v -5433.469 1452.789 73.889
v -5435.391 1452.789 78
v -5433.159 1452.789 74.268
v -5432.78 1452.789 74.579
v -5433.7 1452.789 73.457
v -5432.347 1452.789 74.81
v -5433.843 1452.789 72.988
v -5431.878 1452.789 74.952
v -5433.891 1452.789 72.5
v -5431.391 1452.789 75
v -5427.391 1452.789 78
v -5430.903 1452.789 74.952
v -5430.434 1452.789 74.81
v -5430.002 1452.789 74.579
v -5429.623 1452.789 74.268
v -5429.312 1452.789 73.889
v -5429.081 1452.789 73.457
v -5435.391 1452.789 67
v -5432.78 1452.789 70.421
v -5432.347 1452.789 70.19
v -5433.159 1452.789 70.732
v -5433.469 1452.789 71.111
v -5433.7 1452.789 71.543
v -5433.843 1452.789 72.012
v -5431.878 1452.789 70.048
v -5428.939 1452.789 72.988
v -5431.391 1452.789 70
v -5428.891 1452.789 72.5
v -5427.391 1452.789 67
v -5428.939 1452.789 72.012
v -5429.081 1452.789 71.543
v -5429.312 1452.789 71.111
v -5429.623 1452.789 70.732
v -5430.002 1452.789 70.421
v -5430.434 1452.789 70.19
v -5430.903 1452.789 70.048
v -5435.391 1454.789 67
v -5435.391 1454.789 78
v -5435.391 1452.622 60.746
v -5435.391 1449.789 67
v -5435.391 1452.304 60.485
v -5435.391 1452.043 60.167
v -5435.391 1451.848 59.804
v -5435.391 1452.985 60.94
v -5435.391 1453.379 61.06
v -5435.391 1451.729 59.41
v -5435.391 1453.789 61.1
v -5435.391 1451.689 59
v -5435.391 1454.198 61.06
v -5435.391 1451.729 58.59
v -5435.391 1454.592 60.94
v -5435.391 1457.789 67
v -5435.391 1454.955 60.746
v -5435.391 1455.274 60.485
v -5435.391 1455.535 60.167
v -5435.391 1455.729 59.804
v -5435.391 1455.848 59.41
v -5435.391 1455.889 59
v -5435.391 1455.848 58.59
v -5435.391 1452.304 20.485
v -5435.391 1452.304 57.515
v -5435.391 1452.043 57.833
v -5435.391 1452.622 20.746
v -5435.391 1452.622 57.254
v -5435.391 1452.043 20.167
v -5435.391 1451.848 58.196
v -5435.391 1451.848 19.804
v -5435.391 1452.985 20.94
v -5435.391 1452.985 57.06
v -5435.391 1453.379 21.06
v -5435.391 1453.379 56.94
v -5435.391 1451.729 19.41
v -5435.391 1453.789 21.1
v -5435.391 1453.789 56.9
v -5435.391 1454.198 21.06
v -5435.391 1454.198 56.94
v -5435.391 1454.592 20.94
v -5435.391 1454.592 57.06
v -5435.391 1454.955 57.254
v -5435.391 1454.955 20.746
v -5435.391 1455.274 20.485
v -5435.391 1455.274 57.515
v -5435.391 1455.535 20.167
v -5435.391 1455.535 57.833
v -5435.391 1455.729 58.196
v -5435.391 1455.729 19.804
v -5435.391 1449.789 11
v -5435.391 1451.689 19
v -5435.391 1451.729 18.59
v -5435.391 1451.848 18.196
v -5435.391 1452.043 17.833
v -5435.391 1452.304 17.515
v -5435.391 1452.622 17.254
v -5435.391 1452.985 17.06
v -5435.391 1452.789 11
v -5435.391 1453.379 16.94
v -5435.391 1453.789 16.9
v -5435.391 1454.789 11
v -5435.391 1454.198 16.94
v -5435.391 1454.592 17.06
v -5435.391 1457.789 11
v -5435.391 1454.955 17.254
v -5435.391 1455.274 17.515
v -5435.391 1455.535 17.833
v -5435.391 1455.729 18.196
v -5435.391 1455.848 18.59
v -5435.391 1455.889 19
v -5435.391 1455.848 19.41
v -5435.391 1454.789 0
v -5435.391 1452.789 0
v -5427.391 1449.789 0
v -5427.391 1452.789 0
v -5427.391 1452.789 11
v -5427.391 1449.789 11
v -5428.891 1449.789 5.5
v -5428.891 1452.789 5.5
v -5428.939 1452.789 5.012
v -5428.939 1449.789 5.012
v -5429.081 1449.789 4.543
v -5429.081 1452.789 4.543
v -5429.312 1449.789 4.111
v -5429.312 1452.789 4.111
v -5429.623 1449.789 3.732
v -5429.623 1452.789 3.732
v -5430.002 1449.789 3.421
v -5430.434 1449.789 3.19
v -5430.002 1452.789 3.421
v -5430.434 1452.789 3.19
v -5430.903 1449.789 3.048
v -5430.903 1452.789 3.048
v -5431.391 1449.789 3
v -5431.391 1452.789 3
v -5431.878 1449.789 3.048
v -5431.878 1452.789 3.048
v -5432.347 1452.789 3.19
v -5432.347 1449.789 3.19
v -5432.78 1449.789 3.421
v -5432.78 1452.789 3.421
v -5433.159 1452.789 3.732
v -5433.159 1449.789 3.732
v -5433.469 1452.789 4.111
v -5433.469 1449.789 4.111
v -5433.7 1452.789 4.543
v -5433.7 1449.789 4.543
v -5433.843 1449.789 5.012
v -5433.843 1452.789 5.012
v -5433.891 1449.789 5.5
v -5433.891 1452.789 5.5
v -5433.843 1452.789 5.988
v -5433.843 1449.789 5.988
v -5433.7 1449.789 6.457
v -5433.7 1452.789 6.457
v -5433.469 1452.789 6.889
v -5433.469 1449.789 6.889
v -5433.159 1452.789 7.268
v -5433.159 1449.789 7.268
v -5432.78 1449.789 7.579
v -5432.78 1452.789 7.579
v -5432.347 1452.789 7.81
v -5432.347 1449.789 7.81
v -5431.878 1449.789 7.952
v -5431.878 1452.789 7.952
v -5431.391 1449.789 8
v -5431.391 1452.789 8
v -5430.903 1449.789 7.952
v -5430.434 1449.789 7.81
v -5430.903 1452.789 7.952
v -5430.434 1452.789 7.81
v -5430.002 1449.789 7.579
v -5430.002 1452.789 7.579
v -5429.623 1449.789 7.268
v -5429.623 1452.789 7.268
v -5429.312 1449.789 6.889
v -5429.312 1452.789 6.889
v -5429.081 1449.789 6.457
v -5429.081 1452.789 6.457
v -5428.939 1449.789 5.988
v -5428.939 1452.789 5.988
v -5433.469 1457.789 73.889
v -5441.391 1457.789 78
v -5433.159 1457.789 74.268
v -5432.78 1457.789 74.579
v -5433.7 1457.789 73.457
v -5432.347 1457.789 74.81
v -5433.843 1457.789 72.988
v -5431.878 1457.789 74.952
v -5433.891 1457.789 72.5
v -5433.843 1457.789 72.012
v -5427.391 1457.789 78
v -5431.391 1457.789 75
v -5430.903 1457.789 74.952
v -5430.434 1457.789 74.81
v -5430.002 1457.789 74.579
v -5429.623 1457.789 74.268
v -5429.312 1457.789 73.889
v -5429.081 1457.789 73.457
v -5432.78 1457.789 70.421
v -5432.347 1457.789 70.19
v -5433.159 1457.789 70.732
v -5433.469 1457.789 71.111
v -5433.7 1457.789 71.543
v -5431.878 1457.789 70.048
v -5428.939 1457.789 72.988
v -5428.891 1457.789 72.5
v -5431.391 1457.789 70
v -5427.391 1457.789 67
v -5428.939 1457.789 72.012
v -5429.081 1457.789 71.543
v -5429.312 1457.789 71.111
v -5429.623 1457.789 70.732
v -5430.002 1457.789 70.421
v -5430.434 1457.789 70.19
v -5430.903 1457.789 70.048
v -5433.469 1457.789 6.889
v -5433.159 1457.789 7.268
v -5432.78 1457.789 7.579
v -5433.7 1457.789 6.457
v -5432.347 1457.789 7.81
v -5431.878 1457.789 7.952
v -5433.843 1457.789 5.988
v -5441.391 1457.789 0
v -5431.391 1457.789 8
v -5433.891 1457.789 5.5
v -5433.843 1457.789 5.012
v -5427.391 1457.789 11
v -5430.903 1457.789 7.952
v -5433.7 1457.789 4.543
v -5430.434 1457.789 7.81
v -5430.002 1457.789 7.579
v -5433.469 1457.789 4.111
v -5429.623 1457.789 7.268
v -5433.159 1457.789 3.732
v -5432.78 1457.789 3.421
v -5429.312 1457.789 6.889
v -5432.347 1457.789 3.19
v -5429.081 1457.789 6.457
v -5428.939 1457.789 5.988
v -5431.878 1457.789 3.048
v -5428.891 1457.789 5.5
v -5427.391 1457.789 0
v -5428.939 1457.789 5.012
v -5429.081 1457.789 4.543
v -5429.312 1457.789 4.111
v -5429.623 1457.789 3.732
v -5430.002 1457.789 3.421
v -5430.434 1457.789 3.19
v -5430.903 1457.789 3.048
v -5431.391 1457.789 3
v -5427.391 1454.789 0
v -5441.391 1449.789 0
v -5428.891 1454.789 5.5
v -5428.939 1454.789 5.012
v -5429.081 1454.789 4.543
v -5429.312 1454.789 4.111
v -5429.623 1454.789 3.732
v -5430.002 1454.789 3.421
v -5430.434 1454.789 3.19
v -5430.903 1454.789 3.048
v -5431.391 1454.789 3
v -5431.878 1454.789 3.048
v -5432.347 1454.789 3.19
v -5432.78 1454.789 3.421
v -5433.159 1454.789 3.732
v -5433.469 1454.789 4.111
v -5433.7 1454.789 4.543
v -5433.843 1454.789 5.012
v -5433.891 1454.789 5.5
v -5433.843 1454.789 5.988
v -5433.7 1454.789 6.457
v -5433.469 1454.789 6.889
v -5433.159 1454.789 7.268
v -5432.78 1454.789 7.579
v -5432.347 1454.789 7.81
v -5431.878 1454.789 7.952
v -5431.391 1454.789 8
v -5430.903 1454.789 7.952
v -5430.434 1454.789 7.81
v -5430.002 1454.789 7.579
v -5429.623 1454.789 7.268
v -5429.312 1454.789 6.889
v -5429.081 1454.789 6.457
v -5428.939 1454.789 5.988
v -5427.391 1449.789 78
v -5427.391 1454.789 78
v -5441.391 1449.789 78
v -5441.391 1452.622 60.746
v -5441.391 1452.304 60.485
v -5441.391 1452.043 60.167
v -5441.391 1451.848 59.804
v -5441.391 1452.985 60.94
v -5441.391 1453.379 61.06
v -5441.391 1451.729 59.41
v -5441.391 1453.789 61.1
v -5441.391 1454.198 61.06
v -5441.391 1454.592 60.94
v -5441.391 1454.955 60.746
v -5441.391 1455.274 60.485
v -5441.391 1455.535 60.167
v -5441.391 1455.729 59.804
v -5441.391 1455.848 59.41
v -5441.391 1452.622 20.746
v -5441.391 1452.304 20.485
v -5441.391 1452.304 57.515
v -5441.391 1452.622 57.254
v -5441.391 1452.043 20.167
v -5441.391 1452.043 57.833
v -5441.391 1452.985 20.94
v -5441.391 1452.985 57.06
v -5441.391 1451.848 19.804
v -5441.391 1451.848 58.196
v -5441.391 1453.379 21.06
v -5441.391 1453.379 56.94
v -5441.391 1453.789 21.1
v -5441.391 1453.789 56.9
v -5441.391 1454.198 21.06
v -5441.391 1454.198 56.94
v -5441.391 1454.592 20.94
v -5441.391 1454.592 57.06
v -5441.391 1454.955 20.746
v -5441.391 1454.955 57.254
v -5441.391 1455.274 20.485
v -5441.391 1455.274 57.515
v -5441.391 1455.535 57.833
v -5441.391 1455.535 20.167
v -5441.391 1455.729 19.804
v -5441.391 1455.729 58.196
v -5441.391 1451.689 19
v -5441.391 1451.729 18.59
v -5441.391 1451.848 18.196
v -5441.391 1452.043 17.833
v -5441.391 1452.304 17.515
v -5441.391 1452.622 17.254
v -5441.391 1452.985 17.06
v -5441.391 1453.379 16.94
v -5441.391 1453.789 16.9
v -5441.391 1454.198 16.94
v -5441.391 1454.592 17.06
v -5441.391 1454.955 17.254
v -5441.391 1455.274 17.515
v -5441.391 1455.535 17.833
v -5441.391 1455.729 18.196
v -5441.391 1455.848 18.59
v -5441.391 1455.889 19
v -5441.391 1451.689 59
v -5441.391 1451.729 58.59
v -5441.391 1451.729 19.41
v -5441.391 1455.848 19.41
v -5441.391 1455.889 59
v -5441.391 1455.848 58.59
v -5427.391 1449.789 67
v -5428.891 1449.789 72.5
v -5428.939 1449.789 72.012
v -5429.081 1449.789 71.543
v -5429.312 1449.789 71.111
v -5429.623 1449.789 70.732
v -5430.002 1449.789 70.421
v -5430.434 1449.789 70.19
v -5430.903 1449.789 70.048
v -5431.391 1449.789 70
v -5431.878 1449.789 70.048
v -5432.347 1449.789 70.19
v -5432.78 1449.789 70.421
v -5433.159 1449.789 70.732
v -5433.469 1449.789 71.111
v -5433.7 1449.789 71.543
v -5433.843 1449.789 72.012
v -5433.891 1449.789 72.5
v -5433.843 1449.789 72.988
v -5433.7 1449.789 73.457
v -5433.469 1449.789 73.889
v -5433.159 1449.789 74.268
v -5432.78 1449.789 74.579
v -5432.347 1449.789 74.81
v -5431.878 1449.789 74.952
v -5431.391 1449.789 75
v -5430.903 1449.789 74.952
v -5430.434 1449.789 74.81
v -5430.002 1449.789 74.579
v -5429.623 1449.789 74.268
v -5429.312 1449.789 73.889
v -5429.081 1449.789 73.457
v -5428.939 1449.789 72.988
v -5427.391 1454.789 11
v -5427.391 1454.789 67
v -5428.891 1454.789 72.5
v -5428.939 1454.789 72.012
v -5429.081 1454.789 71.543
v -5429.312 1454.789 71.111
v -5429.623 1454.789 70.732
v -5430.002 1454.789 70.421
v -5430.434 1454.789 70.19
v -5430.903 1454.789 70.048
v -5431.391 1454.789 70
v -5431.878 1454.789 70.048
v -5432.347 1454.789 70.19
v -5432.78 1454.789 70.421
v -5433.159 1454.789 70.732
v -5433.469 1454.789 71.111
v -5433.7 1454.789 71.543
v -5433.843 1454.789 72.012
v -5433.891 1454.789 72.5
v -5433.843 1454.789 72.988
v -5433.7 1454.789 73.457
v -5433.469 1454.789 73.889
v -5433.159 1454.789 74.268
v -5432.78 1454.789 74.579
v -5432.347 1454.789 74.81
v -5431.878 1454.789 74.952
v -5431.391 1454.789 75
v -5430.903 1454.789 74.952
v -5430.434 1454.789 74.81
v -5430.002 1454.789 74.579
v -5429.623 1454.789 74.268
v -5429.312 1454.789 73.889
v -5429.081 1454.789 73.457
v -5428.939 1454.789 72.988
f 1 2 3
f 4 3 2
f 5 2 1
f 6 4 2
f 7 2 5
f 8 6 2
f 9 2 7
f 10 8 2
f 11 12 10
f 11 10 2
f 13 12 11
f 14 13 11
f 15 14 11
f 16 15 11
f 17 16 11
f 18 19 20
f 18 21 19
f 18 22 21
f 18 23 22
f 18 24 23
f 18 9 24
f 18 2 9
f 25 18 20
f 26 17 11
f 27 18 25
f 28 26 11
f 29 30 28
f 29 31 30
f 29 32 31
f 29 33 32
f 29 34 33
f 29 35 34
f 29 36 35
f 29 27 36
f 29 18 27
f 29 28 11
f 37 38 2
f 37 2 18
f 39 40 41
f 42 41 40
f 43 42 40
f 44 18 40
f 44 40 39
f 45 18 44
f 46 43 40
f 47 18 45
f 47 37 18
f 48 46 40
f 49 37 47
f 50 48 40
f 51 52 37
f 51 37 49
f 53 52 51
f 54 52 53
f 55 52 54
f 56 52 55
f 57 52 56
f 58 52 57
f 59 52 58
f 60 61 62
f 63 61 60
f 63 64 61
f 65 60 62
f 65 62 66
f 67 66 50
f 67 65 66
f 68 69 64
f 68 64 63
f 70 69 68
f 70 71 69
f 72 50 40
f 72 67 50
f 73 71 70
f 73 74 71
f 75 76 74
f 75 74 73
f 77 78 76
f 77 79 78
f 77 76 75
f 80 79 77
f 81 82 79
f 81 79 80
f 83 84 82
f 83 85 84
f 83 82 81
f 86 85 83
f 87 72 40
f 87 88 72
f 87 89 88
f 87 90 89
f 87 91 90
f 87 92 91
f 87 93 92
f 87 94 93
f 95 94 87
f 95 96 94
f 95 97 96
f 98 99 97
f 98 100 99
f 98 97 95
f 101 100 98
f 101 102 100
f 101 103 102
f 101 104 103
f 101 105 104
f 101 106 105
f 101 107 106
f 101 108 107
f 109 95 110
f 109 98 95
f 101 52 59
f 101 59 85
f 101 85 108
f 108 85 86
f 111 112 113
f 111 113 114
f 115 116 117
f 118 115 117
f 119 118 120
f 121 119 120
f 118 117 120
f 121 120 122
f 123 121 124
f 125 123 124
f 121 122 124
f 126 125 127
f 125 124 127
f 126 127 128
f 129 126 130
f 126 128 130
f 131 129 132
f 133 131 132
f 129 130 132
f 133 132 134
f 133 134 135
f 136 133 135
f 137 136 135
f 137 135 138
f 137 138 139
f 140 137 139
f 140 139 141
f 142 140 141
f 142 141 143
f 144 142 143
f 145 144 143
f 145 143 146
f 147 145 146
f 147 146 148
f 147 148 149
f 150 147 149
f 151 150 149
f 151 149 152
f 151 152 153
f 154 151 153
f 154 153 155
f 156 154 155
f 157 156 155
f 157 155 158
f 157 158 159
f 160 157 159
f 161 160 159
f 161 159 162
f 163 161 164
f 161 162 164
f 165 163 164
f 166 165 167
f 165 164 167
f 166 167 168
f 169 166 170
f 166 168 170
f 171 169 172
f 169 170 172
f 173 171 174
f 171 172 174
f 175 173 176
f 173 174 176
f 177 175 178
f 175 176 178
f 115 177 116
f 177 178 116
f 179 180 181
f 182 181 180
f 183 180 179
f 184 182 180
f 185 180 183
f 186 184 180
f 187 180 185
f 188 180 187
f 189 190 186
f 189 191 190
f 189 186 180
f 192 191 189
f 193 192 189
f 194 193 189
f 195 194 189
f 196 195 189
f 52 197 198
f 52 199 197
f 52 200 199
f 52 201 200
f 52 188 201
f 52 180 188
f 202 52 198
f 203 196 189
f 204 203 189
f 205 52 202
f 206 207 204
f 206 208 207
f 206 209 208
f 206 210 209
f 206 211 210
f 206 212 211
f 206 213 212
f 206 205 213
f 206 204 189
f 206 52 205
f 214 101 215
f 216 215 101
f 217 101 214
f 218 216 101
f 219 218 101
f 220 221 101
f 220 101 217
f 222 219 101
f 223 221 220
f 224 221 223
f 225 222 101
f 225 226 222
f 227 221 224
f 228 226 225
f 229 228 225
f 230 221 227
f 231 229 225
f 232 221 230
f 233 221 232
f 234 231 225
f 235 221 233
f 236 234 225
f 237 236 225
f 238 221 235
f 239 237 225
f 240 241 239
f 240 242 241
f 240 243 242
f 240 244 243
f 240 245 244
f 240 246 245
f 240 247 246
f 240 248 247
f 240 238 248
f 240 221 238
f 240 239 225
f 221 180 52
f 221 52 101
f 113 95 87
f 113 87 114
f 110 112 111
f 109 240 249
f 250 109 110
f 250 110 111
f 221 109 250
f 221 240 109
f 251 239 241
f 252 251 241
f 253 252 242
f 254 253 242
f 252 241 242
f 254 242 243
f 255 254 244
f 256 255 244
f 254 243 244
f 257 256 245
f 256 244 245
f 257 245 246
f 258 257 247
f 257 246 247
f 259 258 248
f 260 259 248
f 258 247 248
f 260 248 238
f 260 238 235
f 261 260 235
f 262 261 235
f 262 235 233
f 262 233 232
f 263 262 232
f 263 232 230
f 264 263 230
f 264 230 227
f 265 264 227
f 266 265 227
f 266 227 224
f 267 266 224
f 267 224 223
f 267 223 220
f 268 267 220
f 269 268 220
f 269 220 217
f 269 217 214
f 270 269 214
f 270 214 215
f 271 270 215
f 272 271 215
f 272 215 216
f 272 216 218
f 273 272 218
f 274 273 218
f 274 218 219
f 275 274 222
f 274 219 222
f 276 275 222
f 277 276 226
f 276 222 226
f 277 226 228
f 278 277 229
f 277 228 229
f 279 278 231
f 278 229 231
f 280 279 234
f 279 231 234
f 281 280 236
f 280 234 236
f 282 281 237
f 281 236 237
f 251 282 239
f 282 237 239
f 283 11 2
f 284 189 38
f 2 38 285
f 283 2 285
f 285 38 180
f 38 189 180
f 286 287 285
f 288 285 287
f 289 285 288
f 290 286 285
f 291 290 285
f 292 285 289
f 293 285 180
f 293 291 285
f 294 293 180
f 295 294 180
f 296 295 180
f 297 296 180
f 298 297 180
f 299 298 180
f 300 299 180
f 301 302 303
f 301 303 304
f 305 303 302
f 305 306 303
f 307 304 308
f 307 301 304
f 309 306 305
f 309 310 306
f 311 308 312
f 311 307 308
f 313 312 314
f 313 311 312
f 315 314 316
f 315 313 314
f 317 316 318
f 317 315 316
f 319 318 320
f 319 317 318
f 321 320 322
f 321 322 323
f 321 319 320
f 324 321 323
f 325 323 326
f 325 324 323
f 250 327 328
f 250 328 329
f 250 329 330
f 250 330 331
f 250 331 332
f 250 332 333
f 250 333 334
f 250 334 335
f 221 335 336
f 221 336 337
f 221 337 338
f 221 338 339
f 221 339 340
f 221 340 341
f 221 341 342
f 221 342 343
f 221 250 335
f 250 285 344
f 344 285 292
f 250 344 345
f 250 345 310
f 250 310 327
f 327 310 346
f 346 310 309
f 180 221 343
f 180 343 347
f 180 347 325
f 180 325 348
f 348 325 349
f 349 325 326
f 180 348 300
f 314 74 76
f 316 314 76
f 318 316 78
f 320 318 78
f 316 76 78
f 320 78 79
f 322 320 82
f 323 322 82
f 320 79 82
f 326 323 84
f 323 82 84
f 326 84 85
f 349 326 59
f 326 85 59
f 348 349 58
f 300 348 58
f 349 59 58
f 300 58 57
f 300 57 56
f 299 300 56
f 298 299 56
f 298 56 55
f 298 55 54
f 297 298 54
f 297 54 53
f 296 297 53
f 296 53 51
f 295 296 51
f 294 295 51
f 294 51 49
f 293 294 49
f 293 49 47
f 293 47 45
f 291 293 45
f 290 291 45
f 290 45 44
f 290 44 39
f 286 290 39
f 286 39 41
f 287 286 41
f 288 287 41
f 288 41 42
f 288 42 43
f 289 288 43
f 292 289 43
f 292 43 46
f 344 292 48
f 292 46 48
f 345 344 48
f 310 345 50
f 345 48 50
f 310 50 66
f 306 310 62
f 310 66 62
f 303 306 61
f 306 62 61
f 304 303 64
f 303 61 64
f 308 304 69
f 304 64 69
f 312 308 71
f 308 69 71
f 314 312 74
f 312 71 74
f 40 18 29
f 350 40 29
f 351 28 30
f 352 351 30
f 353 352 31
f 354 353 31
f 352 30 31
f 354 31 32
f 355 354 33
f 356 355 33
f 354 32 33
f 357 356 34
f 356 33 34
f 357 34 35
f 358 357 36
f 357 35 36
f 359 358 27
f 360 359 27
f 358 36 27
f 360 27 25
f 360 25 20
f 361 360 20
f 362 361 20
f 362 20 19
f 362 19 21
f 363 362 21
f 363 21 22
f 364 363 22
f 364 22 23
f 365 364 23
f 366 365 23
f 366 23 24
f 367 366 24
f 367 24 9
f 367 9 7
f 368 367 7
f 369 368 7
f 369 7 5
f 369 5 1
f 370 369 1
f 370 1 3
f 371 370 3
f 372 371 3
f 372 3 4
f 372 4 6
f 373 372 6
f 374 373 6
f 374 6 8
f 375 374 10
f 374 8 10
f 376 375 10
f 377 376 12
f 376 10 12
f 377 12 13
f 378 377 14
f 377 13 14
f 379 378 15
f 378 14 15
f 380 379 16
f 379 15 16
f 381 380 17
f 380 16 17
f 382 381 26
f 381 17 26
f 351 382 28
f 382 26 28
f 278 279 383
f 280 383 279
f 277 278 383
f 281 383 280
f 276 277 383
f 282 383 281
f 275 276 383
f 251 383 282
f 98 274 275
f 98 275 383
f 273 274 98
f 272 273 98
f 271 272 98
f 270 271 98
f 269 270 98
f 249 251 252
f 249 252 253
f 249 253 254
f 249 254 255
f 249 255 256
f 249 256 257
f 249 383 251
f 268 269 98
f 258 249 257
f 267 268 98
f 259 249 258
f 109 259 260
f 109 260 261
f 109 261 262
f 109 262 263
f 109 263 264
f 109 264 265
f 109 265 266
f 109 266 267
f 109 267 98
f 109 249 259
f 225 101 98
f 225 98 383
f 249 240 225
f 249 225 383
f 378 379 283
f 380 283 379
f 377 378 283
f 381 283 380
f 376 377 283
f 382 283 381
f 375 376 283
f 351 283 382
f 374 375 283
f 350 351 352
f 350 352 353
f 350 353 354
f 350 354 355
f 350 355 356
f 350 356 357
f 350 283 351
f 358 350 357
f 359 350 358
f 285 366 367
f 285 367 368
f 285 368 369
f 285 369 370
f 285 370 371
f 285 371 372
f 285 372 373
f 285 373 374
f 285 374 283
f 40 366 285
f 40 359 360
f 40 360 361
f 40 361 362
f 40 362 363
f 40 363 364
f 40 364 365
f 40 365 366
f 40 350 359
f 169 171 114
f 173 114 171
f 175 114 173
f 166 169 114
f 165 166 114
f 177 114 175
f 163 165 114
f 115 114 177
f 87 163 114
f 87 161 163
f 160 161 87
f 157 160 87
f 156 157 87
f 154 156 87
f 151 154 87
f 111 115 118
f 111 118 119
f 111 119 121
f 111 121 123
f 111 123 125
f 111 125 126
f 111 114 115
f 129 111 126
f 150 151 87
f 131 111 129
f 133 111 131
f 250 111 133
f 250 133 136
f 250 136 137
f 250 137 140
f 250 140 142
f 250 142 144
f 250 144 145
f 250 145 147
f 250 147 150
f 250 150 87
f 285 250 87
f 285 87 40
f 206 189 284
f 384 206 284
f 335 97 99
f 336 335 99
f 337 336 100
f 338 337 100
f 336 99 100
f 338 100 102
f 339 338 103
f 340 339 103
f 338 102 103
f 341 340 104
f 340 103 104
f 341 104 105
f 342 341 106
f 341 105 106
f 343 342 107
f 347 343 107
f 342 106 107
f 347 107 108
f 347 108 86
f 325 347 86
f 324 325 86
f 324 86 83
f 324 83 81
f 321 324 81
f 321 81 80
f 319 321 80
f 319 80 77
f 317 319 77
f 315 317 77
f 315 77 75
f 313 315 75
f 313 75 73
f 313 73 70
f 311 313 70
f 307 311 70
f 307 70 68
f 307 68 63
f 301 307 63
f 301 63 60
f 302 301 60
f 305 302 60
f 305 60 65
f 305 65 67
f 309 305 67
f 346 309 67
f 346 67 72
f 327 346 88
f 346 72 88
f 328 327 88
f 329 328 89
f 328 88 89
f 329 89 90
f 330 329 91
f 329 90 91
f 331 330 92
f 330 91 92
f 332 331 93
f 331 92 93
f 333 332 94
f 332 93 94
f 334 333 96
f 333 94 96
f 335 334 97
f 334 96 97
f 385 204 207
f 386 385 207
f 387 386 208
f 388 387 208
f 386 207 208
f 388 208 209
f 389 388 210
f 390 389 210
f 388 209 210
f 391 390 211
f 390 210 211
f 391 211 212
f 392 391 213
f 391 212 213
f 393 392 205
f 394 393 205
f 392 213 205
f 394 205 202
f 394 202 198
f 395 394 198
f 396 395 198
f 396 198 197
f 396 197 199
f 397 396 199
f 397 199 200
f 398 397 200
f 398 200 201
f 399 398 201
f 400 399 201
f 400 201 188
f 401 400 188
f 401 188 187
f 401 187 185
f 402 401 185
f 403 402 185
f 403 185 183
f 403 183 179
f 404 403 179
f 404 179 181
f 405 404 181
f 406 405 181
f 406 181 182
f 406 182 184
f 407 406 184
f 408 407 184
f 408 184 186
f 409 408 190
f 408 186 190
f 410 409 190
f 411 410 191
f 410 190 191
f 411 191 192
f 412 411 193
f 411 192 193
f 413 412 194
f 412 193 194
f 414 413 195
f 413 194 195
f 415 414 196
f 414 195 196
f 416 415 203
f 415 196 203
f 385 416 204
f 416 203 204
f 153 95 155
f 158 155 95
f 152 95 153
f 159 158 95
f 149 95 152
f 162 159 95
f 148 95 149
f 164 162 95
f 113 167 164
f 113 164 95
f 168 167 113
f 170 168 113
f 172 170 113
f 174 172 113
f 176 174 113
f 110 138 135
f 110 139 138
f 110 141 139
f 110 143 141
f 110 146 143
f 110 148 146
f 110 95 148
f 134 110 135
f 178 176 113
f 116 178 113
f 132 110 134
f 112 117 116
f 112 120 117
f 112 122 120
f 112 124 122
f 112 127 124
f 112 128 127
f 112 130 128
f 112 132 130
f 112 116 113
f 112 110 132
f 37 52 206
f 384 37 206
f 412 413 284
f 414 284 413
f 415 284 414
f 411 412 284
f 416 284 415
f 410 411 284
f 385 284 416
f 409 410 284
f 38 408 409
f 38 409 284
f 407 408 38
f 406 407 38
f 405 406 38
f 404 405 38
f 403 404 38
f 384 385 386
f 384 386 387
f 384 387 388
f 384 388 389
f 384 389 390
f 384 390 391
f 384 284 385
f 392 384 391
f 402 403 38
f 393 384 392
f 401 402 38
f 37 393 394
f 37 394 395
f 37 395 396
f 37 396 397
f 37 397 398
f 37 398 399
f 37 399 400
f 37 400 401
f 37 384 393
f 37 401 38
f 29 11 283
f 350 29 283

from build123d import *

# Parameters (mm, degrees)
EXTRUDE_1_DEPTH     = 78
SKETCH_2_W          = 8
SKETCH_2_H          = 56
CUT_EXTRUDE_1_DEPTH = 9
SKETCH_3_R          = 2.5
CUT_EXTRUDE_2_DEPTH = 9
HOLE_WIZARD_M5_1_D  = 4.2


with BuildPart() as part:
    # 草图1 → 凸台-拉伸1 (new body)
    with BuildSketch(Plane.XY):
        Polygon((-5441.39073995, 1449.788604117), (-5441.39073995, 1457.788604117), (-5427.39073995, 1457.788604117), (-5427.39073995, 1454.788604117), (-5435.39073995, 1454.788604117), (-5435.39073995, 1452.788604117), (-5427.39073995, 1452.788604117), (-5427.39073995, 1449.788604117), align=None)
    extrude(amount=EXTRUDE_1_DEPTH)

    # 草图2 → 切除-拉伸1 (cut, through all)
    with BuildSketch(Plane(origin=(0, 1457.788604117, 0), x_dir=(1, 0, 0), z_dir=(0, 1, 0))):
        with Locations((-5431.39073995, -39)):
            Rectangle(SKETCH_2_W, SKETCH_2_H)
    extrude(amount=-CUT_EXTRUDE_1_DEPTH, mode=Mode.SUBTRACT)

    # 草图3 → 切除-拉伸2 (cut, through all)
    with BuildSketch(Plane(origin=(0, 1457.788604117, 0), x_dir=(1, 0, 0), z_dir=(0, 1, 0))):
        with Locations((-5431.39073995, -72.5)):
            Circle(SKETCH_3_R)
        with Locations((-5431.39073995, -5.5)):
            Circle(SKETCH_3_R)
    extrude(amount=-CUT_EXTRUDE_2_DEPTH, mode=Mode.SUBTRACT)

    # M5 螺纹孔1 (through all)
    with Locations(Plane.ZY.offset(5441.39073995)):
        with Locations((59, 1453.788604117), (19, 1453.788604117)):
            Hole(HOLE_WIZARD_M5_1_D / 2)


solid = part.part
